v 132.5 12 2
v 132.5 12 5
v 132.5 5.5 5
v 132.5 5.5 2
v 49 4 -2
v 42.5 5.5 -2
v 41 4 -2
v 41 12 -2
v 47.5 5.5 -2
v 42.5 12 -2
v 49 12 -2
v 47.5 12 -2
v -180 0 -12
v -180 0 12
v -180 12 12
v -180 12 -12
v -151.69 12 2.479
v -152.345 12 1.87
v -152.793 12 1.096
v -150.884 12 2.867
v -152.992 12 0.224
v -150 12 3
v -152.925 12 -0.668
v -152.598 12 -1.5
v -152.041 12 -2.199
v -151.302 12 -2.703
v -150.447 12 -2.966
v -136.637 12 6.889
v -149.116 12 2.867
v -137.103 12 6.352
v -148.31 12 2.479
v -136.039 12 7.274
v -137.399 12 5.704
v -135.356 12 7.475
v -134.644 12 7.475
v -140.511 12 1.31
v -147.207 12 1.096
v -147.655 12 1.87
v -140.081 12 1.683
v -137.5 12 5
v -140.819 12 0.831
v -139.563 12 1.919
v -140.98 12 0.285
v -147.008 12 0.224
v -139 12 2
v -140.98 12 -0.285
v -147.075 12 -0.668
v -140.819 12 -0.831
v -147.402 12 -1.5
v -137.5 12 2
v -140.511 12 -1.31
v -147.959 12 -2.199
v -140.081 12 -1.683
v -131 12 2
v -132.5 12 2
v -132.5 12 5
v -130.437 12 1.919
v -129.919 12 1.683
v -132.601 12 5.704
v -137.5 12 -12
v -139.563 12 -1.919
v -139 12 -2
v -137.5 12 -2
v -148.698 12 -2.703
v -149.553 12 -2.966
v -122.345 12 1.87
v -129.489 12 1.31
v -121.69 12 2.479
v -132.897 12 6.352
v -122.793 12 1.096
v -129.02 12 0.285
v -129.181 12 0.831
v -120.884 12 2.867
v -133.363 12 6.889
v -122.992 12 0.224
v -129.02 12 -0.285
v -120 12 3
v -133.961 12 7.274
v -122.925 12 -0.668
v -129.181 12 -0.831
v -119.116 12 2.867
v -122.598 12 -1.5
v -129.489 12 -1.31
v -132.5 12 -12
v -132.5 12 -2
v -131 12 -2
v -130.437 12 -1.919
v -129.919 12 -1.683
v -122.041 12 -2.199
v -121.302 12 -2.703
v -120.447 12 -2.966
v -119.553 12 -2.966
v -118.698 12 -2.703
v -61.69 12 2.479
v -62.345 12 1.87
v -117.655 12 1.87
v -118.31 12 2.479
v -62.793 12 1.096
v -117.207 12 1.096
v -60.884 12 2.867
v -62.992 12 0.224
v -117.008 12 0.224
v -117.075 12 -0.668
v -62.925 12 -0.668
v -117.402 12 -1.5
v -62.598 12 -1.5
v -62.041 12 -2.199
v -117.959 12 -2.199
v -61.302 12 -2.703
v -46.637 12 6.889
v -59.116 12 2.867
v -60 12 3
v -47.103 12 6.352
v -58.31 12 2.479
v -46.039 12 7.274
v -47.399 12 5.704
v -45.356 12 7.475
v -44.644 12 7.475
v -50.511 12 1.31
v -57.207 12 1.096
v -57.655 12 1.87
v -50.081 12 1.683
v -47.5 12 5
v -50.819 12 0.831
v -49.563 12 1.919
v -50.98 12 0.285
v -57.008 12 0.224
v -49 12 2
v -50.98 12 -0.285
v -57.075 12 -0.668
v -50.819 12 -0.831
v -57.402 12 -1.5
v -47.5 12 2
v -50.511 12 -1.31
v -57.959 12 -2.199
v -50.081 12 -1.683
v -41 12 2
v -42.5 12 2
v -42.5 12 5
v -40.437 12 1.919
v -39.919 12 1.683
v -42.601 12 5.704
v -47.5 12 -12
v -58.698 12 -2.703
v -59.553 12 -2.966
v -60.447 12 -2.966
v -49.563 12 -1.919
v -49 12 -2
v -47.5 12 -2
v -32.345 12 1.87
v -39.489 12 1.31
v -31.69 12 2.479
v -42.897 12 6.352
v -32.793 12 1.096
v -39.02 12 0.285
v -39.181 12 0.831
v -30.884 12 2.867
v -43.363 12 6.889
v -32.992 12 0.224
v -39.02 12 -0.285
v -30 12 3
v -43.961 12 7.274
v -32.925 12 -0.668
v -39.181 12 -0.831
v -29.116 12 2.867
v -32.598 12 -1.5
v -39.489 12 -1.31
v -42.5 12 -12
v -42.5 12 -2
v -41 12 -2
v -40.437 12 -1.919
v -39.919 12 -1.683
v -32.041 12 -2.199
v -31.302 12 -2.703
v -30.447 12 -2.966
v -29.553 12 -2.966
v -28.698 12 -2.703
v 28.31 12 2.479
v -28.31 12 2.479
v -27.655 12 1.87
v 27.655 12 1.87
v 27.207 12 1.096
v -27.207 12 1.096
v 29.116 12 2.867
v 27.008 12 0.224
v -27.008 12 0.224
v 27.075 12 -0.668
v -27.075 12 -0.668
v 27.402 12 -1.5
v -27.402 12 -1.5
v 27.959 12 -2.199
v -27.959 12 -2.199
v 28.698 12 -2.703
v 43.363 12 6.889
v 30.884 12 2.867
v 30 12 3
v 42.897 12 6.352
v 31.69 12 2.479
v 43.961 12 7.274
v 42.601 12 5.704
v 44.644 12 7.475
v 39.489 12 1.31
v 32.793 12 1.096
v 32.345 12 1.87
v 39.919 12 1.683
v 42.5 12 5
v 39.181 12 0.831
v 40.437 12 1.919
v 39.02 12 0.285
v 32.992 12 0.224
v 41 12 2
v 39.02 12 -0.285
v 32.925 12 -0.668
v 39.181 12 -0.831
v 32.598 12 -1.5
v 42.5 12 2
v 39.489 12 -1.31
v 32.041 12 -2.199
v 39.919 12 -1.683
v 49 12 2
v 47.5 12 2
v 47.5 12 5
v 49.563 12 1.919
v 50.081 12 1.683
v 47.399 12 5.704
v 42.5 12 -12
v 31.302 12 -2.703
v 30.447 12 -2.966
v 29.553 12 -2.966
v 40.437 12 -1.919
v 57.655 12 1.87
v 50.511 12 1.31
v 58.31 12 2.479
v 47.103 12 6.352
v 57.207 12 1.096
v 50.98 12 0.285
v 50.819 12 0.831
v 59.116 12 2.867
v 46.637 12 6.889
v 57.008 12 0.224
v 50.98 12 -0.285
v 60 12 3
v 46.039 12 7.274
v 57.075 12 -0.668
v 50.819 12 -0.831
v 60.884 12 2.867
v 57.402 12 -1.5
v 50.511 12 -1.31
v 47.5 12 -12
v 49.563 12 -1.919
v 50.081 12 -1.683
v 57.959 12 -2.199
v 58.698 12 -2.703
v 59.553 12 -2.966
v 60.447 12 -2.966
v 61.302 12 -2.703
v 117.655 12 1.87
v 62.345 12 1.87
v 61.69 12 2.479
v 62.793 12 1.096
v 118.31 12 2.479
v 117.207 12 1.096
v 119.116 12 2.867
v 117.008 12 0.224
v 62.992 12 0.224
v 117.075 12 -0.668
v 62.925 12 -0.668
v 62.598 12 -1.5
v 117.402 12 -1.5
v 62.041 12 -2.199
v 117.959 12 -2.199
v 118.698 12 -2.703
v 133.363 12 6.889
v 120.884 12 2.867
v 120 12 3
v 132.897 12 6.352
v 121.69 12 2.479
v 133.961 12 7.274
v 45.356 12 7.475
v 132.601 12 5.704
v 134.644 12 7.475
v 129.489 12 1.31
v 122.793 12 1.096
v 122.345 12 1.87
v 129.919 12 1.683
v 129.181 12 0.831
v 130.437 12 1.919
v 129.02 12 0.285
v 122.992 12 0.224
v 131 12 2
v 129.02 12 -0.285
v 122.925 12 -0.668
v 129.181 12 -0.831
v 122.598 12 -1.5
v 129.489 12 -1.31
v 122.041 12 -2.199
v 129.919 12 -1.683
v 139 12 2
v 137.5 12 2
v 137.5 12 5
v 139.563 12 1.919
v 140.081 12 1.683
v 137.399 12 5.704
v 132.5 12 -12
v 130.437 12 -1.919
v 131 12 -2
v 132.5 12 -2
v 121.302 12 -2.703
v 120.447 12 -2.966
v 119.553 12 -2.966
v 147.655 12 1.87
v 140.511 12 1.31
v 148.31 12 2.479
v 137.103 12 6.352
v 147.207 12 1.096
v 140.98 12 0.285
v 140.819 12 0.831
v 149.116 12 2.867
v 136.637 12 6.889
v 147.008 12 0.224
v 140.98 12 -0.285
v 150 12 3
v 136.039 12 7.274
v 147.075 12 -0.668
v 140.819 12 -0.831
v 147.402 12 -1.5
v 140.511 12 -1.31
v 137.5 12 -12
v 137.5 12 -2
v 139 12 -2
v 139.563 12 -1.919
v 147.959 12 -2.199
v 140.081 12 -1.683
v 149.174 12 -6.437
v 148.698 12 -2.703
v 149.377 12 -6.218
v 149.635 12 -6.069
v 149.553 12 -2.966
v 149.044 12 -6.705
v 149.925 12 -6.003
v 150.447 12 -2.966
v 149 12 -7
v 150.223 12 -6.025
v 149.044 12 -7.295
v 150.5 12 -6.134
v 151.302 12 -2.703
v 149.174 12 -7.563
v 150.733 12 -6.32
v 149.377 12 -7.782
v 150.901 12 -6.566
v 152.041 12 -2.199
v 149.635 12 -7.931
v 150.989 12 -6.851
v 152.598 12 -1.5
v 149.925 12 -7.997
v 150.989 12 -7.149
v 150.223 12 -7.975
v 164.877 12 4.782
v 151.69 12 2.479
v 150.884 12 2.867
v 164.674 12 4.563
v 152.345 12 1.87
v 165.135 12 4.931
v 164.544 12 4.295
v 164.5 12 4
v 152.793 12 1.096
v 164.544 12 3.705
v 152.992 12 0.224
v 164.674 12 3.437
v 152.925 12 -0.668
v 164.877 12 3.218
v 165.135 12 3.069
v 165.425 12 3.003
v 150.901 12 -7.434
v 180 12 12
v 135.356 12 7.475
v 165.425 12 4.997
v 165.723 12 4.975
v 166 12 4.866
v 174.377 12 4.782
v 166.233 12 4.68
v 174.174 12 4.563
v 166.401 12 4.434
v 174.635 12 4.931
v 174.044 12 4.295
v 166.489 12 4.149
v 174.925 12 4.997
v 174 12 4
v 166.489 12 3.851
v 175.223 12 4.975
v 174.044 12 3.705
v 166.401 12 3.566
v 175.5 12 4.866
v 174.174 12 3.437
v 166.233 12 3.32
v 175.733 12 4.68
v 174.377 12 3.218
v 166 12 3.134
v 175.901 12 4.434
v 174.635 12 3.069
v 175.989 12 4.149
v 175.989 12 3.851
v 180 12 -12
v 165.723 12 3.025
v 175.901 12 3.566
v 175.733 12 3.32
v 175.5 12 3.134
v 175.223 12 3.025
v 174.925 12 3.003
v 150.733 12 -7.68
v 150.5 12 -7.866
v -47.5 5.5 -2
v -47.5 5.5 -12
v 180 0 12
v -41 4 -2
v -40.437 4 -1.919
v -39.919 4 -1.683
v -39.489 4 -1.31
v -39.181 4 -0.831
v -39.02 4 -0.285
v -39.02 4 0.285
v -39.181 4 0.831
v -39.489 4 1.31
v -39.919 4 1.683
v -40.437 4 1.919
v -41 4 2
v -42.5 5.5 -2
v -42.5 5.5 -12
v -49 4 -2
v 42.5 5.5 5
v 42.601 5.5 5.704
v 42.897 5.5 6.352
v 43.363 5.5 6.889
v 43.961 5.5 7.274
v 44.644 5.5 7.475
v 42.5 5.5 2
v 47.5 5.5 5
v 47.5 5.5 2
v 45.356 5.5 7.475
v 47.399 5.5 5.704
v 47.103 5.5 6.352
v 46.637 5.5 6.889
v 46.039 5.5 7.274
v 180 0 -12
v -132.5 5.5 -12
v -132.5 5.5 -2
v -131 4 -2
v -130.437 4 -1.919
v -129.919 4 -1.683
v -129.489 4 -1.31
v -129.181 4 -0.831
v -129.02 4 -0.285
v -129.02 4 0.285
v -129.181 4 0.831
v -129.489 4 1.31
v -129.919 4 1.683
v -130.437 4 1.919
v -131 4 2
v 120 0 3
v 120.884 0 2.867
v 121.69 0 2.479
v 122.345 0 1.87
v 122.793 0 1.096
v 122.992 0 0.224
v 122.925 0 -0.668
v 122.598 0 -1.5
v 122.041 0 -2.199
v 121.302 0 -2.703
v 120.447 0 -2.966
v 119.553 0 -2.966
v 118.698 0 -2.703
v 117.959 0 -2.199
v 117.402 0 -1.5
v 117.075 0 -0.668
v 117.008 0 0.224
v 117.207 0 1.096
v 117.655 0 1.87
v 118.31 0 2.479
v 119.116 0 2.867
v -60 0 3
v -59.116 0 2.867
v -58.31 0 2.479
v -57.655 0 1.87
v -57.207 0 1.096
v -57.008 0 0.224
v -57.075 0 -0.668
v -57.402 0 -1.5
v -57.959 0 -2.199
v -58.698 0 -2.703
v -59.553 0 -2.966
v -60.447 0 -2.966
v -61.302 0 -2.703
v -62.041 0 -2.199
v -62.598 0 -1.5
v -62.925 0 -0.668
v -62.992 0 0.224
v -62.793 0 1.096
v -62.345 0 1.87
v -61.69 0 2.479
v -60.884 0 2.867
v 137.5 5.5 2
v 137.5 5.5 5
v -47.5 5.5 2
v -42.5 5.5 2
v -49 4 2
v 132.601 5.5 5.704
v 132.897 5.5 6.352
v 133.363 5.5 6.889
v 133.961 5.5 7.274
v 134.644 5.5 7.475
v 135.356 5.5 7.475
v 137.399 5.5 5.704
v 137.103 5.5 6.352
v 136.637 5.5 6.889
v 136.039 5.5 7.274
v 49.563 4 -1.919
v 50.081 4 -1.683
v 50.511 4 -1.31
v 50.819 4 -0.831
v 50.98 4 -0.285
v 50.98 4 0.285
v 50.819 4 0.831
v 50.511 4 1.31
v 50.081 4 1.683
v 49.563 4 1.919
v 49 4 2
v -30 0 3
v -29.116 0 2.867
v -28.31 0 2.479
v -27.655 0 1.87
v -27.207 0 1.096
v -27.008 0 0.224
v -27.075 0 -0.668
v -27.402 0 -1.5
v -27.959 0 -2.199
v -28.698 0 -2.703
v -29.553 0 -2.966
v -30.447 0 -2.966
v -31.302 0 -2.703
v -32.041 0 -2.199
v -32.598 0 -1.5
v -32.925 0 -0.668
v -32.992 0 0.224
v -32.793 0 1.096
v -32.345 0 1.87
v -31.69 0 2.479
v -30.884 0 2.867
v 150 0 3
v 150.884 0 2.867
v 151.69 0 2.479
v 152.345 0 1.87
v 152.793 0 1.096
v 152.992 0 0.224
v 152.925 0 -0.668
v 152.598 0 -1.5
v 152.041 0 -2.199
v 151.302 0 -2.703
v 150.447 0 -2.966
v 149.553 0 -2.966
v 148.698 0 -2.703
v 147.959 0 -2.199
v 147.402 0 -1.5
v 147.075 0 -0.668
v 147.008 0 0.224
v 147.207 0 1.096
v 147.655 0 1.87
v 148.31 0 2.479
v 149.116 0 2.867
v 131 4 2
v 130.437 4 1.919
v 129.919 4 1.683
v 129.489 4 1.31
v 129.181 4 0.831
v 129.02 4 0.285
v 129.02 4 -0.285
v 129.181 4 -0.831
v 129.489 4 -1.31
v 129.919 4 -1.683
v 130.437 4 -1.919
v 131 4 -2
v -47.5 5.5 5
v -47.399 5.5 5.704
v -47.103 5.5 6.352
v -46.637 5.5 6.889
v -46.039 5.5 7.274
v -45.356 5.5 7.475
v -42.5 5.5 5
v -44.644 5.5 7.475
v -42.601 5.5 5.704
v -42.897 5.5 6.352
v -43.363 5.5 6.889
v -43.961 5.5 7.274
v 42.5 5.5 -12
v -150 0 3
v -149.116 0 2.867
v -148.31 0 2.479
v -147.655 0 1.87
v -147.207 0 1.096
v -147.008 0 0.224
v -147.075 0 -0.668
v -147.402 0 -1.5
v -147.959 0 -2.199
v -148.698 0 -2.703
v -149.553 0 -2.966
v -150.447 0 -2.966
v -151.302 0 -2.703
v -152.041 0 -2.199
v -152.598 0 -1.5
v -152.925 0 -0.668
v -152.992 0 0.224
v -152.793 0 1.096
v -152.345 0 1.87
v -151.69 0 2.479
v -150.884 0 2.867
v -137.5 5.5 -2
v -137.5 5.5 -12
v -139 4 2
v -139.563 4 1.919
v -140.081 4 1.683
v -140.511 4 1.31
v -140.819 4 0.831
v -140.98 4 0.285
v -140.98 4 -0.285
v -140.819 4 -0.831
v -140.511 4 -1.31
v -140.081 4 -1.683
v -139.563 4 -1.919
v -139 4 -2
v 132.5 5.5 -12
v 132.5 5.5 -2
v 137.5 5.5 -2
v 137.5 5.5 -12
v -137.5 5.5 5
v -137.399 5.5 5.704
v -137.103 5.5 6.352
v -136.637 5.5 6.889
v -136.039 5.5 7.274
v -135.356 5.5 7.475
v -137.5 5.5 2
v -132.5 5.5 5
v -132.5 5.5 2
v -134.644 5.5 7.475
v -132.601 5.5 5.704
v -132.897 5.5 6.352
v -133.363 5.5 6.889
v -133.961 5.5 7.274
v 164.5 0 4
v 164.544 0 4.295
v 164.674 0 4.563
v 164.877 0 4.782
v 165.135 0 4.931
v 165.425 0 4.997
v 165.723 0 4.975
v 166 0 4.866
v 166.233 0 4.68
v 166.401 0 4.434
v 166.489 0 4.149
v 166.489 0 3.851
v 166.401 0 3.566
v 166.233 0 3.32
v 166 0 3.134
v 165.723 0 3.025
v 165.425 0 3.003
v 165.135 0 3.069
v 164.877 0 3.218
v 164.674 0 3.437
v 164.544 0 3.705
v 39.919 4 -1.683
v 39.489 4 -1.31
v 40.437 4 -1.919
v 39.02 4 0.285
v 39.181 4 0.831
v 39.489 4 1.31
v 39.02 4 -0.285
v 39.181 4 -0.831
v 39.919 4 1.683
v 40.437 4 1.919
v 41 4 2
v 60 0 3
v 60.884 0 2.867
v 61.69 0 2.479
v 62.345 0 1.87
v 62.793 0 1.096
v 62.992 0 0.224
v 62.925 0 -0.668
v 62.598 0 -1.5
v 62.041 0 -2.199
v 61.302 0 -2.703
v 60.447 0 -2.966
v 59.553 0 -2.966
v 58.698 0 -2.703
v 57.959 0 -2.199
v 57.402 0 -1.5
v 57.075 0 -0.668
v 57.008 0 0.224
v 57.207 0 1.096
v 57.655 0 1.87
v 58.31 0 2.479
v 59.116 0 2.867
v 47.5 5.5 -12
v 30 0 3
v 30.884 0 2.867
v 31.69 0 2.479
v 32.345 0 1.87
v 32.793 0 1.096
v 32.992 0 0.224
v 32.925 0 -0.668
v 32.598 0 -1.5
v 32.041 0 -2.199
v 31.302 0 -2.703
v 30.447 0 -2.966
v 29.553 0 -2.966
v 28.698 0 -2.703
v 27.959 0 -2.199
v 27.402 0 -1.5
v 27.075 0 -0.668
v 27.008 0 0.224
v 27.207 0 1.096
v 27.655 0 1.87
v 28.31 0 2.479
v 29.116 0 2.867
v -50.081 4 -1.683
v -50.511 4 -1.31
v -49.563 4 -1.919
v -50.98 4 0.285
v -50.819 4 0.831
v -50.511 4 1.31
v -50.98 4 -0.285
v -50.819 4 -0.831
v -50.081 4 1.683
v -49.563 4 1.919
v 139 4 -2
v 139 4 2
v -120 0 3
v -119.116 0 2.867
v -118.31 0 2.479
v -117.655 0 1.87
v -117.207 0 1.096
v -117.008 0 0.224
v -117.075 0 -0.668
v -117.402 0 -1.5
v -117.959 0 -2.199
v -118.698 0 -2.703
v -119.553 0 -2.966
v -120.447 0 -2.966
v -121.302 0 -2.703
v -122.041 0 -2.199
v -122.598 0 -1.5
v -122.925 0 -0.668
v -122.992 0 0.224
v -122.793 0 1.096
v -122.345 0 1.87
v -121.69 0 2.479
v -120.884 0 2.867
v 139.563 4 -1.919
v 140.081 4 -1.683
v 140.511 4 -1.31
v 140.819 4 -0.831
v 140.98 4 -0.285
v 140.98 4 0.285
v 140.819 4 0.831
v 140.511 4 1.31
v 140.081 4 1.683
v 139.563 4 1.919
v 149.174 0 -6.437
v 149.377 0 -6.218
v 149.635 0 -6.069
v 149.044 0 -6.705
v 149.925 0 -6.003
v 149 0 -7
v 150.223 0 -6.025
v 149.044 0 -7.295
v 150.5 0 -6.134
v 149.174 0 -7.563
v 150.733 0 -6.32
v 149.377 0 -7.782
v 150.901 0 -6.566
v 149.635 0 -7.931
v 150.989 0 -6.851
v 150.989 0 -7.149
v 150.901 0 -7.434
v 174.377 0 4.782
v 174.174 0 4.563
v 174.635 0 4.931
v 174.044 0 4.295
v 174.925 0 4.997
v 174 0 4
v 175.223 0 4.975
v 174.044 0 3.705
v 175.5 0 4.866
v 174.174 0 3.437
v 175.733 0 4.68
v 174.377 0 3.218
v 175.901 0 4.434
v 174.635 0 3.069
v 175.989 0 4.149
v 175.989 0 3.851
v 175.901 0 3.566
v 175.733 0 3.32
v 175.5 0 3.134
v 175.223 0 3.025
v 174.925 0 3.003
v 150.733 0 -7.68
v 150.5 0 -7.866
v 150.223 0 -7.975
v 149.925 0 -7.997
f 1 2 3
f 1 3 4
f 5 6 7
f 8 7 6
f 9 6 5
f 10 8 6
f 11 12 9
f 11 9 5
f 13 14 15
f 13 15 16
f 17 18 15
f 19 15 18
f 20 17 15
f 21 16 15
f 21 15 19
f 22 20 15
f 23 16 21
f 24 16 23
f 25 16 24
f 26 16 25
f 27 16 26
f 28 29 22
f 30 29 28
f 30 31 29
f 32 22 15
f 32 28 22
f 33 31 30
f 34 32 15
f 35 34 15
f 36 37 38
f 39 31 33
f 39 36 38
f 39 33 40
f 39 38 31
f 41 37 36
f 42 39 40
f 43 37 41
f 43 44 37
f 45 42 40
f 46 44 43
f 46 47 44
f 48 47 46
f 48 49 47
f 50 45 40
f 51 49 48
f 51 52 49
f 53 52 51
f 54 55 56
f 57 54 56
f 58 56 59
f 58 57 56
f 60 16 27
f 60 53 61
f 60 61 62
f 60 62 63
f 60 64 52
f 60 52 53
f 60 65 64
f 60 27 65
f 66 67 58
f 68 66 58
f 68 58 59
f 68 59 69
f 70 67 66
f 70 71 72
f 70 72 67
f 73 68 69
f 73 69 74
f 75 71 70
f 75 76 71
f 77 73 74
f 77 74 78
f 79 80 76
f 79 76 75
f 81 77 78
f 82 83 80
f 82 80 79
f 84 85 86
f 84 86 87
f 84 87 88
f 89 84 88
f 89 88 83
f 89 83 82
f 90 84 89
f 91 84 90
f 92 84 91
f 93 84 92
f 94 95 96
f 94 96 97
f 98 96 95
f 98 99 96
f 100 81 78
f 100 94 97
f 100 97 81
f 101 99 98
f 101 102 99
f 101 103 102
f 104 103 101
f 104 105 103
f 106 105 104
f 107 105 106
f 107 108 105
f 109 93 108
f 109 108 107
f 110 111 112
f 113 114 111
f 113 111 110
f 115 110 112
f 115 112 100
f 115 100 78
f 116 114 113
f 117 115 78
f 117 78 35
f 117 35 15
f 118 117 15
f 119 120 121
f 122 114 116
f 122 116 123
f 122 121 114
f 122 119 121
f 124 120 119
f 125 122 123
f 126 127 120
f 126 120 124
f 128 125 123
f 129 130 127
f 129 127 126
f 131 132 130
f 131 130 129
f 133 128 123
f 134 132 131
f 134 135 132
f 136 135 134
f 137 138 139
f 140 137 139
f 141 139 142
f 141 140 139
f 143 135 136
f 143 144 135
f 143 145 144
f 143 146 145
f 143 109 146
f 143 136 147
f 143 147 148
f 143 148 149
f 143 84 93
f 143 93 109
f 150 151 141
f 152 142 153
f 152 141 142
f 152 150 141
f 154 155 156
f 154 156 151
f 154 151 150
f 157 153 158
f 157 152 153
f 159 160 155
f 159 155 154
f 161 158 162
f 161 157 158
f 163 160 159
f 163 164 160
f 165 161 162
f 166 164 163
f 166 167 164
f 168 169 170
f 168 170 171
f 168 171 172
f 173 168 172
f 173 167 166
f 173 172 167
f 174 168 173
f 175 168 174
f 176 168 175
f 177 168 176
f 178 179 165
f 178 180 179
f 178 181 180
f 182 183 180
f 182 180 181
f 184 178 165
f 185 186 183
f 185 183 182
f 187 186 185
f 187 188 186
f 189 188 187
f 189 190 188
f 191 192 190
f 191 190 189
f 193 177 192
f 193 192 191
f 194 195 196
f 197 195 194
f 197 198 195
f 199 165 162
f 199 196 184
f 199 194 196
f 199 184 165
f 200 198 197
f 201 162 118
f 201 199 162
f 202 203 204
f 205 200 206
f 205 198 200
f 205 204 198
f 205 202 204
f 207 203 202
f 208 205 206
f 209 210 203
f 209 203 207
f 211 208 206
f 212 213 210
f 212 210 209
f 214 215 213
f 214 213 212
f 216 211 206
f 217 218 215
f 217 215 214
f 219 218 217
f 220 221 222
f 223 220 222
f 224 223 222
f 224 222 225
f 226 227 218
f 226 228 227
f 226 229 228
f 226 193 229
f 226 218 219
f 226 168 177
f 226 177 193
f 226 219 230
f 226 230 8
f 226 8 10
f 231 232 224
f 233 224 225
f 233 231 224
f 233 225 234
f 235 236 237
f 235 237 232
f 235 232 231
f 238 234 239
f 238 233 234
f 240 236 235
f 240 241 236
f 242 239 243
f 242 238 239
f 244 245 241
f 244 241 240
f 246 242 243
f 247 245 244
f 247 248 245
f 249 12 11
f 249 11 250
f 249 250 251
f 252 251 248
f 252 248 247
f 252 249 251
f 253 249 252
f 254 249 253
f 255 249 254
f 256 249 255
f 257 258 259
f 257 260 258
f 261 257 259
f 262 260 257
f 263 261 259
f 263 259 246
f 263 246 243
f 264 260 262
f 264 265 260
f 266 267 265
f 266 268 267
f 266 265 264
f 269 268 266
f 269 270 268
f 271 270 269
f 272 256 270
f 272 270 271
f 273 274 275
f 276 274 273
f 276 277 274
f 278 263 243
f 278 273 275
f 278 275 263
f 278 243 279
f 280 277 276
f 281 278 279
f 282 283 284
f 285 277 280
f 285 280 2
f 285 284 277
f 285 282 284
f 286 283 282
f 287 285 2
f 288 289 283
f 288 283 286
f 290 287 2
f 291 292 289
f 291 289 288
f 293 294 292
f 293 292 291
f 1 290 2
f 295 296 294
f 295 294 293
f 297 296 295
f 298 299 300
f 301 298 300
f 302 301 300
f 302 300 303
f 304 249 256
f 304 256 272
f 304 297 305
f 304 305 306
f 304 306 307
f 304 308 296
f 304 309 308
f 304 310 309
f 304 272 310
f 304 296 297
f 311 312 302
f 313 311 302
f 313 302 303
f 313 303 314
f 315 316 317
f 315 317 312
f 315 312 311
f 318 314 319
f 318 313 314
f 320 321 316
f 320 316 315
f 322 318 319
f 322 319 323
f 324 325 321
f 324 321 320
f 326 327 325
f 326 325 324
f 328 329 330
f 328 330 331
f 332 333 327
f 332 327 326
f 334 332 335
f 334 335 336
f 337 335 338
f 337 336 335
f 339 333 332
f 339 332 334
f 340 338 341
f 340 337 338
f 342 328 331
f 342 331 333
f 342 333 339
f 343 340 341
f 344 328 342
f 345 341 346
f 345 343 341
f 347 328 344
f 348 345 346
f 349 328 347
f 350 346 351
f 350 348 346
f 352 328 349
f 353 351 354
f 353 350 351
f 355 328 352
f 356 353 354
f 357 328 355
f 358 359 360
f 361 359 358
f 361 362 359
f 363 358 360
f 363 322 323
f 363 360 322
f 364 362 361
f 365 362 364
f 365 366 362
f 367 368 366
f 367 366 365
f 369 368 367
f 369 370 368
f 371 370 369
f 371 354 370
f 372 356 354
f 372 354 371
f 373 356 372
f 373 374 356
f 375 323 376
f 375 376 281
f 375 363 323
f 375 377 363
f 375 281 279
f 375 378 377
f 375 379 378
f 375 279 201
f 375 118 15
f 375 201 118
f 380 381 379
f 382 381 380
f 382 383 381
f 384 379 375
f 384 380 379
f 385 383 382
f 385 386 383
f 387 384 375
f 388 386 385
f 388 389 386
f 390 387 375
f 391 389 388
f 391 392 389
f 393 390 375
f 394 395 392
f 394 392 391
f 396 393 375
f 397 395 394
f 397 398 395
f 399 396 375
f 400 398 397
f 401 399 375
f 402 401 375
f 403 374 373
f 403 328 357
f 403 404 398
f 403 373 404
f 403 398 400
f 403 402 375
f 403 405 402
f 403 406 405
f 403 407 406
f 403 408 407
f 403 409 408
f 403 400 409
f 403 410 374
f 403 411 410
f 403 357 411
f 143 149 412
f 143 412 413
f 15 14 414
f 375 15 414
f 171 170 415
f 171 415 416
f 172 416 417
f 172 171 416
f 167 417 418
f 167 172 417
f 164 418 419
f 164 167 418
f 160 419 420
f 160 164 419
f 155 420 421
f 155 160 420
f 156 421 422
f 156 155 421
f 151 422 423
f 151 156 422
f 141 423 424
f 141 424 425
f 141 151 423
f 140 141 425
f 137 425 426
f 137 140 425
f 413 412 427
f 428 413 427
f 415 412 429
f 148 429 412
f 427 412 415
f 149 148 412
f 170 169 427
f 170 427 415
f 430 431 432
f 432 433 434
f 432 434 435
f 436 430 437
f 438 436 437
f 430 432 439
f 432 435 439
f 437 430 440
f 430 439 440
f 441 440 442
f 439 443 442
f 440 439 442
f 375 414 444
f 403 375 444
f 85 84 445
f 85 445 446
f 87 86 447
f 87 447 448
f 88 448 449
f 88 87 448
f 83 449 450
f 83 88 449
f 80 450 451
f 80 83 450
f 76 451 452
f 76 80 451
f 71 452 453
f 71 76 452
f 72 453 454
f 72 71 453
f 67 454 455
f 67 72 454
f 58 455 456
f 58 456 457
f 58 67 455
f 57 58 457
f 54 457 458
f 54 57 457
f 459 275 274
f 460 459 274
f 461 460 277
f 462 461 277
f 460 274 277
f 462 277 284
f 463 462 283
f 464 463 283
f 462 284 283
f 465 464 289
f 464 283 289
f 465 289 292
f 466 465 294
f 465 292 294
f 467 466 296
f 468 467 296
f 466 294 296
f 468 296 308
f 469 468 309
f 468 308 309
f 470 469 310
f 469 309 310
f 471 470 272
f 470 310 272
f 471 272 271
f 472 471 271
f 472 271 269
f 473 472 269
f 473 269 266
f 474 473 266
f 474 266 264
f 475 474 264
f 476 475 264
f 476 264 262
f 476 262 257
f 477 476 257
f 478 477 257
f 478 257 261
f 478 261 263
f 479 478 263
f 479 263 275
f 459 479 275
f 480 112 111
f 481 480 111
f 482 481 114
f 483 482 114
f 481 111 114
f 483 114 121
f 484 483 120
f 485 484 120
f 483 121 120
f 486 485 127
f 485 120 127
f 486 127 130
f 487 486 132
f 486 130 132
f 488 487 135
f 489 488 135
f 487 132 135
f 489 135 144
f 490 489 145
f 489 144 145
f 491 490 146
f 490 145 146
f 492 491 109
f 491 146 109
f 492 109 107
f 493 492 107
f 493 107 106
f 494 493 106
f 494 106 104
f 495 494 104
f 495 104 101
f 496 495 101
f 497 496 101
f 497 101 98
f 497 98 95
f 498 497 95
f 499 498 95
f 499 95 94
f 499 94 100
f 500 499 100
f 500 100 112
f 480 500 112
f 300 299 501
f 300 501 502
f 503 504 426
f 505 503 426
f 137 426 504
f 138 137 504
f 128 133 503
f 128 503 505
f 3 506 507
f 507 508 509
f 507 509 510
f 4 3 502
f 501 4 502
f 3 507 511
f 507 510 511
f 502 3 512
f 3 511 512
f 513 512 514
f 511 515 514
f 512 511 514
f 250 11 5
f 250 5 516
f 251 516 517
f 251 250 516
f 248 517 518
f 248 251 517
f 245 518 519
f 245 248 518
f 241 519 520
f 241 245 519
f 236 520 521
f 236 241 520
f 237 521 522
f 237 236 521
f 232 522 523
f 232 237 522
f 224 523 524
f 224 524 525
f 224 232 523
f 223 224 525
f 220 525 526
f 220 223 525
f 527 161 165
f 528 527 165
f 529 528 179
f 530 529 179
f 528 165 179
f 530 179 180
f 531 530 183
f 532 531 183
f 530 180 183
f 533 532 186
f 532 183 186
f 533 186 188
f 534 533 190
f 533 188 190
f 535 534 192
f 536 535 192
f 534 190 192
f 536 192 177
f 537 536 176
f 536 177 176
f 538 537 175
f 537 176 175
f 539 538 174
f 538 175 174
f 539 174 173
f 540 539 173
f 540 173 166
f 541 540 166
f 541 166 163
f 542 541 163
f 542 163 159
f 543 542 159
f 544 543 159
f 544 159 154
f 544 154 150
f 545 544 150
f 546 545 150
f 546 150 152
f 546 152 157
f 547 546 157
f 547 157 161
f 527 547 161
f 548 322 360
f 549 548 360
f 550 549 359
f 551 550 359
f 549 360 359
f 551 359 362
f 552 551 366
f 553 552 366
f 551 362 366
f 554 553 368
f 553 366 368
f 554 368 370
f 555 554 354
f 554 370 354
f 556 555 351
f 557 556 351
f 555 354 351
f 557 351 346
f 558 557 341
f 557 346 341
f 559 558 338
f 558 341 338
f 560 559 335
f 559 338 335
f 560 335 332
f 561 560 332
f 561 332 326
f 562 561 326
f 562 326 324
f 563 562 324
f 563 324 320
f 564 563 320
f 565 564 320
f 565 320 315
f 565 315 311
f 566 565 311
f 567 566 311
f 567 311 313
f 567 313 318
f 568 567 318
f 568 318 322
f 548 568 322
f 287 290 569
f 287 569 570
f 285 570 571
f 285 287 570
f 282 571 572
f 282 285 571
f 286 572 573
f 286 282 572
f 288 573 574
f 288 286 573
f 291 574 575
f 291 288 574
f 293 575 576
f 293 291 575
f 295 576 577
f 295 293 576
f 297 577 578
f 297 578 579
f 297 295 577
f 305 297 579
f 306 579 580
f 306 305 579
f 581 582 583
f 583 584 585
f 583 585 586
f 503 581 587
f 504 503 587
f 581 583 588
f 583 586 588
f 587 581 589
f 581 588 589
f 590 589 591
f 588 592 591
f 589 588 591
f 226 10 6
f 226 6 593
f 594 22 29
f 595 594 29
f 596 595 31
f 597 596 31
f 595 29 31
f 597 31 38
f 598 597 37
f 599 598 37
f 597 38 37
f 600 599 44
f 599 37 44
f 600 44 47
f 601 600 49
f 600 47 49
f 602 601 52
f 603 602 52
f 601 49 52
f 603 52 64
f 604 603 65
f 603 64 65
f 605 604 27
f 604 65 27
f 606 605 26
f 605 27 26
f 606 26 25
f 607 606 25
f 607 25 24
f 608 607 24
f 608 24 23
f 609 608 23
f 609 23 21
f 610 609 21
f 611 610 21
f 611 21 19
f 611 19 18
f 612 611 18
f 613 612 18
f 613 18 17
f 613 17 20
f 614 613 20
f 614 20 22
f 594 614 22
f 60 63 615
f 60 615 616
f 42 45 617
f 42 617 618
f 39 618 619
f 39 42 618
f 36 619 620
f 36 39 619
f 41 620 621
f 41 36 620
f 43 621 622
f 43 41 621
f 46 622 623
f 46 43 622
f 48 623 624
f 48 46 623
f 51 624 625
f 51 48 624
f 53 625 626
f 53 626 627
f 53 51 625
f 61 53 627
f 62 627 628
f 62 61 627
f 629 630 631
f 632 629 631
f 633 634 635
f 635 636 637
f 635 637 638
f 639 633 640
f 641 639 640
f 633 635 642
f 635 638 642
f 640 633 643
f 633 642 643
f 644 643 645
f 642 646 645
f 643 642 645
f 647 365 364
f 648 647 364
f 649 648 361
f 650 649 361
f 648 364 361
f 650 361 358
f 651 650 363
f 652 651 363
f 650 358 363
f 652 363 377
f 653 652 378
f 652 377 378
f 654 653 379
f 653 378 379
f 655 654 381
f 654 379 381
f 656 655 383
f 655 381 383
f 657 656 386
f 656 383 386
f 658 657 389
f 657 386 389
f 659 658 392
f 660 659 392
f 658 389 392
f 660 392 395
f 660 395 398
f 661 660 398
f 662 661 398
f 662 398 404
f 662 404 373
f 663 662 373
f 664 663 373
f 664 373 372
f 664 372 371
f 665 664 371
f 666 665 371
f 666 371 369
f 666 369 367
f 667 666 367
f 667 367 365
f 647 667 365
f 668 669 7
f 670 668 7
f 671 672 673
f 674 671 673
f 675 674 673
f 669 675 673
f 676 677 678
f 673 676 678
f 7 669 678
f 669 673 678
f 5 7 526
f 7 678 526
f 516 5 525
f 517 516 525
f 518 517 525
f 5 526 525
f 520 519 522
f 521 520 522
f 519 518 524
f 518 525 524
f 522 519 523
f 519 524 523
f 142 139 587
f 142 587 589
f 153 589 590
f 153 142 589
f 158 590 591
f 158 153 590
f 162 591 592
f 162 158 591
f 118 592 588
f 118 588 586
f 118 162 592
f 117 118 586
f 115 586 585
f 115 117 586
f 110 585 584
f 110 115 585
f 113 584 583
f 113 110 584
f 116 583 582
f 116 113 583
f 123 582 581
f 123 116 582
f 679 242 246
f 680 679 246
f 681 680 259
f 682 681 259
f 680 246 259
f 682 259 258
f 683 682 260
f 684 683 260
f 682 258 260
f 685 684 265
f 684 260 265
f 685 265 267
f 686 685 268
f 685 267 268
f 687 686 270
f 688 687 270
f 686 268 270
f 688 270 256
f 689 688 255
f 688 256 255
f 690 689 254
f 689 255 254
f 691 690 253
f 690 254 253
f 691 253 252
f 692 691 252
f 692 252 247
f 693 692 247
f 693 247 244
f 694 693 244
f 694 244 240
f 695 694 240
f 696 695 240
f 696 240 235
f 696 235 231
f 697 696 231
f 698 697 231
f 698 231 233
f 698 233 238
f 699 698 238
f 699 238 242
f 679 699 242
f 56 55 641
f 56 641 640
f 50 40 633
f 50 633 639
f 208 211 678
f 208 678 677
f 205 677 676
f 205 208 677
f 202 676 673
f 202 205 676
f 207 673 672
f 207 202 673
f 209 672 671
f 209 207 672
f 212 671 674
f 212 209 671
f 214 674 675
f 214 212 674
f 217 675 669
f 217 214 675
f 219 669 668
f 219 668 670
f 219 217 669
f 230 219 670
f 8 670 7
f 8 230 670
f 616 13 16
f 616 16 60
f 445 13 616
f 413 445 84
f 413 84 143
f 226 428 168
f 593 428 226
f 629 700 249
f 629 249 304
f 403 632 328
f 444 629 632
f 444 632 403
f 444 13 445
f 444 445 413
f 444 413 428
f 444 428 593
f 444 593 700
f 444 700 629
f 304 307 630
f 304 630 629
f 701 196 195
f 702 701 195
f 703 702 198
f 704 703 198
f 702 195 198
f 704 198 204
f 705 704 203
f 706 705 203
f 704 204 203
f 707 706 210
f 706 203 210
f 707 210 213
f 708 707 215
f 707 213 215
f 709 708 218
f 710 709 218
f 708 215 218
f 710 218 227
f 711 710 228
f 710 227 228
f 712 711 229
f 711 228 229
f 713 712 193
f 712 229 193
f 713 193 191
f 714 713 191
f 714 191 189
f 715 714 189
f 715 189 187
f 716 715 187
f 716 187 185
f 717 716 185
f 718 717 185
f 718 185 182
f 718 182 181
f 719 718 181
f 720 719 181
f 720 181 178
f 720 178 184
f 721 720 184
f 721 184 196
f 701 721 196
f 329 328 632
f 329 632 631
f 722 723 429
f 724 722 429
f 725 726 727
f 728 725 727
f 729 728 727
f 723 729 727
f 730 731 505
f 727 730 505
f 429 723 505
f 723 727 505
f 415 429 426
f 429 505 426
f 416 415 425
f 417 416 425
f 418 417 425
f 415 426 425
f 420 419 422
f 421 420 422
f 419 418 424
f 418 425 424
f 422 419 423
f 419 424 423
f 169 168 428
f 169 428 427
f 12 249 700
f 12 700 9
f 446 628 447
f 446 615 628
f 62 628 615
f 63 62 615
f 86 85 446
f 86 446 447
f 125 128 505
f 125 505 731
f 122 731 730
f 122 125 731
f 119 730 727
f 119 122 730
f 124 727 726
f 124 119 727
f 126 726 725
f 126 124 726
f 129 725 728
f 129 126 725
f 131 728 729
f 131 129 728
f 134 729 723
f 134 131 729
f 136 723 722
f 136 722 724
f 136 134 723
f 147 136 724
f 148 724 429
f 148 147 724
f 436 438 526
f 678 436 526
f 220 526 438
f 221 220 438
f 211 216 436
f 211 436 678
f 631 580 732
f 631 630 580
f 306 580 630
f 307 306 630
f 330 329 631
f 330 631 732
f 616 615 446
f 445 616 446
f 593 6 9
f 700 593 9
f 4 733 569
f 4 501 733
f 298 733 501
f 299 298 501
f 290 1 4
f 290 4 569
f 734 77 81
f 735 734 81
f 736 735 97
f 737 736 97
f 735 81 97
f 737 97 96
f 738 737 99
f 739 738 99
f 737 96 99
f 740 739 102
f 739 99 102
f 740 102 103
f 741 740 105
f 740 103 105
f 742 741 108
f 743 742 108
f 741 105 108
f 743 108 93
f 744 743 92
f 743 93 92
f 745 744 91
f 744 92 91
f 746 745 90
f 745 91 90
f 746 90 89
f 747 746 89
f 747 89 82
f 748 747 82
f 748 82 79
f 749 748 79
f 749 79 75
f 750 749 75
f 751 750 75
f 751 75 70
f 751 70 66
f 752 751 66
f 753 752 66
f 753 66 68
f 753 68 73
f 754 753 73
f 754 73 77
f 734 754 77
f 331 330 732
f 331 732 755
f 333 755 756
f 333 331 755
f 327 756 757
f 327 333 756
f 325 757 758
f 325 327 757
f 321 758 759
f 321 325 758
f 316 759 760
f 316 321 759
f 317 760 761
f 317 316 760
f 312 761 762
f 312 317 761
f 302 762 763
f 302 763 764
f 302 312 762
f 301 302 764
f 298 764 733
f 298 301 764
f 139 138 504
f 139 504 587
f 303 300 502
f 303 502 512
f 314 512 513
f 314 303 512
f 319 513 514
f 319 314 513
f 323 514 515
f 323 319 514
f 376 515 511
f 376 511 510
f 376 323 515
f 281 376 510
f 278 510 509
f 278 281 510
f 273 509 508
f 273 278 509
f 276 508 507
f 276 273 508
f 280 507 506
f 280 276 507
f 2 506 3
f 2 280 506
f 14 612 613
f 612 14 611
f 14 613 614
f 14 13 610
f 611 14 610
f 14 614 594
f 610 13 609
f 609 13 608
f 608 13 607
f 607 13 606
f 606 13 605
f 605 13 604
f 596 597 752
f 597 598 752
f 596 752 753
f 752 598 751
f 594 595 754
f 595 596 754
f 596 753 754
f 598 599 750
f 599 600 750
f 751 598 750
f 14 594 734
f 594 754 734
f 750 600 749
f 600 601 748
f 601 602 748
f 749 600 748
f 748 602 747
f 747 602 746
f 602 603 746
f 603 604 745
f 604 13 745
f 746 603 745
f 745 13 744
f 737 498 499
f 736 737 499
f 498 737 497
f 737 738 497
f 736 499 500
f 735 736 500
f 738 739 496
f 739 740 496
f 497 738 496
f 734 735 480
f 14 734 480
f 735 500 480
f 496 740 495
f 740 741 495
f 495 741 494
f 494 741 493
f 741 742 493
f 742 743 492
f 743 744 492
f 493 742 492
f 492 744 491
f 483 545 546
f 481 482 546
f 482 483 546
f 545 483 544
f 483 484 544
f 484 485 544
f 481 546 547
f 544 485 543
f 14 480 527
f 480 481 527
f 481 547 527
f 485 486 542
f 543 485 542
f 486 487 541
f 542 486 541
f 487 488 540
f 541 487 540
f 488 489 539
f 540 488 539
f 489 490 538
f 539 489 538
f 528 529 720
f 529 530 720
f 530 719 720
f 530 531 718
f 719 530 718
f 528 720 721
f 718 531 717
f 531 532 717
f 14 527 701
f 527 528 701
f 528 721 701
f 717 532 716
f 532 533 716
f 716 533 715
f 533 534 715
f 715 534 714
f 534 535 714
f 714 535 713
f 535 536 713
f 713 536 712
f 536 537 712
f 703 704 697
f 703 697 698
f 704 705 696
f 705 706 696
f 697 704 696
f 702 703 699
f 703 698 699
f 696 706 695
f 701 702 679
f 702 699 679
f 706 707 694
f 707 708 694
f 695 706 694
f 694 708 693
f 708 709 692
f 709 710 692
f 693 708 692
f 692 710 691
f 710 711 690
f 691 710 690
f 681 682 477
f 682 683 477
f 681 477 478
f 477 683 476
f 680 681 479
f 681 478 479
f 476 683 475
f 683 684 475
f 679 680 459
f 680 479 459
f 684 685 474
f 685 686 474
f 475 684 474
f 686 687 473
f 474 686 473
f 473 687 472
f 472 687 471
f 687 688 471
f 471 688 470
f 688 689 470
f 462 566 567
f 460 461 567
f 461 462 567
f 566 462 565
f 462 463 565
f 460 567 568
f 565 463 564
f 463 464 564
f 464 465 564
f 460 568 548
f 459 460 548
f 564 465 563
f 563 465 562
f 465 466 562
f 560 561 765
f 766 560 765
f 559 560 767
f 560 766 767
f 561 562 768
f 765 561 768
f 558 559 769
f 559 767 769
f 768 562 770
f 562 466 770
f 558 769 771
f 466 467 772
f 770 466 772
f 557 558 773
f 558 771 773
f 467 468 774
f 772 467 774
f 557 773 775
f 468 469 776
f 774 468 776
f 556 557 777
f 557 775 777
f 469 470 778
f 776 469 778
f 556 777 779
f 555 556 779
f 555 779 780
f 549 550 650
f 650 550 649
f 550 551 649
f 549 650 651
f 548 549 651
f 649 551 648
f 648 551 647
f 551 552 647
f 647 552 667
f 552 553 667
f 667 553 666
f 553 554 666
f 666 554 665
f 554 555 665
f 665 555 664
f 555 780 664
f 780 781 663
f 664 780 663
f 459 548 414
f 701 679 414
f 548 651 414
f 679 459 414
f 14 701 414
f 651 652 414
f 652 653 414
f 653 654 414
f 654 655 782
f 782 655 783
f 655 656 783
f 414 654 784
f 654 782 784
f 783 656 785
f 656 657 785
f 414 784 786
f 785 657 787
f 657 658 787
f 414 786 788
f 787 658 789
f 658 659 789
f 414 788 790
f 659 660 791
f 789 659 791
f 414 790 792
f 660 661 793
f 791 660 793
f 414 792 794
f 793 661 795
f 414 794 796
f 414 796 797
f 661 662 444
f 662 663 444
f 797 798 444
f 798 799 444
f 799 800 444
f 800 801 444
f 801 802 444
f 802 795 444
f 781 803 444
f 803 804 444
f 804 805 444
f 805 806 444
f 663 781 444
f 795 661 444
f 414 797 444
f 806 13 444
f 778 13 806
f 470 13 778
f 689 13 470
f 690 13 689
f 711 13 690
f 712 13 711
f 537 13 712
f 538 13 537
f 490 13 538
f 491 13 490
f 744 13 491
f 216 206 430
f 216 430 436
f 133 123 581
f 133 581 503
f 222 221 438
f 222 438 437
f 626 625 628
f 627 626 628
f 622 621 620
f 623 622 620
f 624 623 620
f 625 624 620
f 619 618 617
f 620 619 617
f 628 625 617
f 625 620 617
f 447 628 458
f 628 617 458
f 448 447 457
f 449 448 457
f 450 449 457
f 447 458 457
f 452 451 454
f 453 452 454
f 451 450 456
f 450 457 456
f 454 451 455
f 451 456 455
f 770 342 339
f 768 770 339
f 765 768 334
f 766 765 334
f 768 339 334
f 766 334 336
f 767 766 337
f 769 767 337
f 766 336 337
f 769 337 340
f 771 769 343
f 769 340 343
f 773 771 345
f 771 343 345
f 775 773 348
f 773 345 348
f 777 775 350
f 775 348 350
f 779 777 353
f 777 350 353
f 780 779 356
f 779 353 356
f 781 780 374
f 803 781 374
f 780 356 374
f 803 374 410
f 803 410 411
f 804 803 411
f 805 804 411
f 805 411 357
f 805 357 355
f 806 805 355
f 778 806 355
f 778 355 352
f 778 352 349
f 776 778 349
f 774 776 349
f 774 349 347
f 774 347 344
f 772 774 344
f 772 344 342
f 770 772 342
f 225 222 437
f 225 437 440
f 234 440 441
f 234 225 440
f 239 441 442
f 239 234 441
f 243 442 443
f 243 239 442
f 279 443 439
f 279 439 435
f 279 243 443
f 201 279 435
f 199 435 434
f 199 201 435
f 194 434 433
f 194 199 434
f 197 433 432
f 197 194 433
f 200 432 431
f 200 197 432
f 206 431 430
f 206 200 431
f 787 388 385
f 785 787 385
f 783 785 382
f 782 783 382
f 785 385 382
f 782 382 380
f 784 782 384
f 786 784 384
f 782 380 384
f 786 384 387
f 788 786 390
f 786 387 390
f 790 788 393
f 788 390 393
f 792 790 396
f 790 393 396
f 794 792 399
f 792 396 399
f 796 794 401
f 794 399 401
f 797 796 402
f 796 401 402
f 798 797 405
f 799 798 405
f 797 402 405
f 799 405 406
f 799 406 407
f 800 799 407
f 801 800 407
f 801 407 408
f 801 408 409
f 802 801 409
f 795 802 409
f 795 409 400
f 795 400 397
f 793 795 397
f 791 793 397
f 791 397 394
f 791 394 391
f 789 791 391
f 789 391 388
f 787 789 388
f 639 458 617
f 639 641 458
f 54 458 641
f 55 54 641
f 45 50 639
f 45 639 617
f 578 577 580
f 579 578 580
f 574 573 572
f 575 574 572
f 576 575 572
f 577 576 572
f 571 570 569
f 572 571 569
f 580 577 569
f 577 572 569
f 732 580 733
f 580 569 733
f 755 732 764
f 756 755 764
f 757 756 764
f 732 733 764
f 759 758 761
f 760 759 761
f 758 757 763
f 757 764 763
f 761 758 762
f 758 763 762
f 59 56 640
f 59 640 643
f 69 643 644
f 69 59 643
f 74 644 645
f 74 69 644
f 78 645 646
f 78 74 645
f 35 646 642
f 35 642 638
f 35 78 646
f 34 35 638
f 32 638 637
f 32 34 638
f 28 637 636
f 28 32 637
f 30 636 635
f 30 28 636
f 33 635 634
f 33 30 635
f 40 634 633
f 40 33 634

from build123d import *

# Parameters (mm, degrees)
SKETCH1_W                = 360
SKETCH1_H                = 24
BOSS_EXTRUDE1_DEPTH      = 12
CUT_EXTRUDE1_REACH       = 182.798
SKETCH2_R                = 3
CUT_EXTRUDE2_DEPTH       = 8
CUT_EXTRUDE3_DEPTH       = 6.5
LPATTERN1_COUNT          = 4
LPATTERN1_PITCH          = 90
F_2_0_2_DIAMETER_HOLE1_D = 2


with BuildPart() as part:
    # Sketch1 → Boss-Extrude1 (new body)
    with BuildSketch(Plane(origin=(0, 0, 0), x_dir=(1, 0, 0), z_dir=(0, 1, 0))):
        Rectangle(SKETCH1_W, SKETCH1_H)
    extrude(amount=BOSS_EXTRUDE1_DEPTH)

    # Sketch2 → Cut-Extrude1 (cut, up to next)
    with BuildSketch(Plane(origin=(0, 12, 0), x_dir=(1, 0, 0), z_dir=(0, 1, 0)), mode=Mode.PRIVATE) as cut_extrude1_sk1:
        with Locations(Location((-150, 0, 0), (0, 0, 270))):
            Circle(SKETCH2_R)
    cut_extrude1_tool1 = extrude(cut_extrude1_sk1.sketch, amount=-CUT_EXTRUDE1_REACH, mode=Mode.PRIVATE) & part.part
    # Sketch2 → Cut-Extrude1 (cut, up to next)
    with BuildSketch(Plane(origin=(0, 12, 0), x_dir=(1, 0, 0), z_dir=(0, 1, 0)), mode=Mode.PRIVATE) as cut_extrude1_sk2:
        with Locations(Location((-120, 0, 0), (0, 0, 270))):
            Circle(SKETCH2_R)
    cut_extrude1_tool2 = extrude(cut_extrude1_sk2.sketch, amount=-CUT_EXTRUDE1_REACH, mode=Mode.PRIVATE) & part.part
    cut_extrude1_1 = cut_extrude1_tool1.solids().sort_by_distance((-150, 12, 0))[0]
    add(cut_extrude1_1, mode=Mode.SUBTRACT)
    cut_extrude1_2 = cut_extrude1_tool2.solids().sort_by_distance((-120, 12, 0))[0]
    add(cut_extrude1_2, mode=Mode.SUBTRACT)
    cut_extrude1 = cut_extrude1_1 + cut_extrude1_2  # Cut-Extrude1 as one shape, for the pattern or mirror that repeats it

    # Sketch11 → Cut-Extrude2 (cut)
    with BuildSketch(Plane(origin=(-63.484819349, 12, 93.481372316), x_dir=(-1, 0, 0), z_dir=(0, 1, 0))):
        with BuildLine():
            Line((67.515180651, -91.481372316), (75.515180651, -91.481372316))
            ThreePointArc((75.515180651, -91.481372316), (77.515180651, -93.481372316), (75.515180651, -95.481372316))
            Line((75.515180651, -95.481372316), (67.515180651, -95.481372316))
            ThreePointArc((67.515180651, -95.481372316), (65.515180651, -93.481372316), (67.515180651, -91.481372316))
        make_face()
    cut_extrude2 = extrude(amount=-CUT_EXTRUDE2_DEPTH, mode=Mode.SUBTRACT)

    # Sketch13 → Cut-Extrude3 (cut)
    with BuildSketch(Plane(origin=(-63.484819349, 12, 93.481372316), x_dir=(-1, 0, 0), z_dir=(0, 1, 0))):
        with BuildLine():
            Line((74.015180651, -88.481372316), (74.015180651, -142.11123171))
            ThreePointArc((74.015180651, -142.11123171), (71.515180651, -144.61123171), (69.015180651, -142.11123171))
            Line((69.015180651, -142.11123171), (69.015180651, -88.481372316))
            ThreePointArc((69.015180651, -88.481372316), (71.515180651, -85.981372316), (74.015180651, -88.481372316))
        make_face()
    cut_extrude3 = extrude(amount=-CUT_EXTRUDE3_DEPTH, mode=Mode.SUBTRACT)

    # LPattern1: Cut-Extrude1, Cut-Extrude2, Cut-Extrude3 ×4
    with Locations(*[(i * LPATTERN1_PITCH, 0, 0) for i in range(1, LPATTERN1_COUNT)]):
        add(cut_extrude1, mode=Mode.SUBTRACT)
        add(cut_extrude2, mode=Mode.SUBTRACT)
        add(cut_extrude3, mode=Mode.SUBTRACT)

    # Ø2.0 (2) Diameter Hole1 (through all)
    with Locations(Plane.XZ):
        with Locations((165.5, 4), (175, 4), (150, -7)):
            Hole(F_2_0_2_DIAMETER_HOLE1_D / 2)


solid = part.part
